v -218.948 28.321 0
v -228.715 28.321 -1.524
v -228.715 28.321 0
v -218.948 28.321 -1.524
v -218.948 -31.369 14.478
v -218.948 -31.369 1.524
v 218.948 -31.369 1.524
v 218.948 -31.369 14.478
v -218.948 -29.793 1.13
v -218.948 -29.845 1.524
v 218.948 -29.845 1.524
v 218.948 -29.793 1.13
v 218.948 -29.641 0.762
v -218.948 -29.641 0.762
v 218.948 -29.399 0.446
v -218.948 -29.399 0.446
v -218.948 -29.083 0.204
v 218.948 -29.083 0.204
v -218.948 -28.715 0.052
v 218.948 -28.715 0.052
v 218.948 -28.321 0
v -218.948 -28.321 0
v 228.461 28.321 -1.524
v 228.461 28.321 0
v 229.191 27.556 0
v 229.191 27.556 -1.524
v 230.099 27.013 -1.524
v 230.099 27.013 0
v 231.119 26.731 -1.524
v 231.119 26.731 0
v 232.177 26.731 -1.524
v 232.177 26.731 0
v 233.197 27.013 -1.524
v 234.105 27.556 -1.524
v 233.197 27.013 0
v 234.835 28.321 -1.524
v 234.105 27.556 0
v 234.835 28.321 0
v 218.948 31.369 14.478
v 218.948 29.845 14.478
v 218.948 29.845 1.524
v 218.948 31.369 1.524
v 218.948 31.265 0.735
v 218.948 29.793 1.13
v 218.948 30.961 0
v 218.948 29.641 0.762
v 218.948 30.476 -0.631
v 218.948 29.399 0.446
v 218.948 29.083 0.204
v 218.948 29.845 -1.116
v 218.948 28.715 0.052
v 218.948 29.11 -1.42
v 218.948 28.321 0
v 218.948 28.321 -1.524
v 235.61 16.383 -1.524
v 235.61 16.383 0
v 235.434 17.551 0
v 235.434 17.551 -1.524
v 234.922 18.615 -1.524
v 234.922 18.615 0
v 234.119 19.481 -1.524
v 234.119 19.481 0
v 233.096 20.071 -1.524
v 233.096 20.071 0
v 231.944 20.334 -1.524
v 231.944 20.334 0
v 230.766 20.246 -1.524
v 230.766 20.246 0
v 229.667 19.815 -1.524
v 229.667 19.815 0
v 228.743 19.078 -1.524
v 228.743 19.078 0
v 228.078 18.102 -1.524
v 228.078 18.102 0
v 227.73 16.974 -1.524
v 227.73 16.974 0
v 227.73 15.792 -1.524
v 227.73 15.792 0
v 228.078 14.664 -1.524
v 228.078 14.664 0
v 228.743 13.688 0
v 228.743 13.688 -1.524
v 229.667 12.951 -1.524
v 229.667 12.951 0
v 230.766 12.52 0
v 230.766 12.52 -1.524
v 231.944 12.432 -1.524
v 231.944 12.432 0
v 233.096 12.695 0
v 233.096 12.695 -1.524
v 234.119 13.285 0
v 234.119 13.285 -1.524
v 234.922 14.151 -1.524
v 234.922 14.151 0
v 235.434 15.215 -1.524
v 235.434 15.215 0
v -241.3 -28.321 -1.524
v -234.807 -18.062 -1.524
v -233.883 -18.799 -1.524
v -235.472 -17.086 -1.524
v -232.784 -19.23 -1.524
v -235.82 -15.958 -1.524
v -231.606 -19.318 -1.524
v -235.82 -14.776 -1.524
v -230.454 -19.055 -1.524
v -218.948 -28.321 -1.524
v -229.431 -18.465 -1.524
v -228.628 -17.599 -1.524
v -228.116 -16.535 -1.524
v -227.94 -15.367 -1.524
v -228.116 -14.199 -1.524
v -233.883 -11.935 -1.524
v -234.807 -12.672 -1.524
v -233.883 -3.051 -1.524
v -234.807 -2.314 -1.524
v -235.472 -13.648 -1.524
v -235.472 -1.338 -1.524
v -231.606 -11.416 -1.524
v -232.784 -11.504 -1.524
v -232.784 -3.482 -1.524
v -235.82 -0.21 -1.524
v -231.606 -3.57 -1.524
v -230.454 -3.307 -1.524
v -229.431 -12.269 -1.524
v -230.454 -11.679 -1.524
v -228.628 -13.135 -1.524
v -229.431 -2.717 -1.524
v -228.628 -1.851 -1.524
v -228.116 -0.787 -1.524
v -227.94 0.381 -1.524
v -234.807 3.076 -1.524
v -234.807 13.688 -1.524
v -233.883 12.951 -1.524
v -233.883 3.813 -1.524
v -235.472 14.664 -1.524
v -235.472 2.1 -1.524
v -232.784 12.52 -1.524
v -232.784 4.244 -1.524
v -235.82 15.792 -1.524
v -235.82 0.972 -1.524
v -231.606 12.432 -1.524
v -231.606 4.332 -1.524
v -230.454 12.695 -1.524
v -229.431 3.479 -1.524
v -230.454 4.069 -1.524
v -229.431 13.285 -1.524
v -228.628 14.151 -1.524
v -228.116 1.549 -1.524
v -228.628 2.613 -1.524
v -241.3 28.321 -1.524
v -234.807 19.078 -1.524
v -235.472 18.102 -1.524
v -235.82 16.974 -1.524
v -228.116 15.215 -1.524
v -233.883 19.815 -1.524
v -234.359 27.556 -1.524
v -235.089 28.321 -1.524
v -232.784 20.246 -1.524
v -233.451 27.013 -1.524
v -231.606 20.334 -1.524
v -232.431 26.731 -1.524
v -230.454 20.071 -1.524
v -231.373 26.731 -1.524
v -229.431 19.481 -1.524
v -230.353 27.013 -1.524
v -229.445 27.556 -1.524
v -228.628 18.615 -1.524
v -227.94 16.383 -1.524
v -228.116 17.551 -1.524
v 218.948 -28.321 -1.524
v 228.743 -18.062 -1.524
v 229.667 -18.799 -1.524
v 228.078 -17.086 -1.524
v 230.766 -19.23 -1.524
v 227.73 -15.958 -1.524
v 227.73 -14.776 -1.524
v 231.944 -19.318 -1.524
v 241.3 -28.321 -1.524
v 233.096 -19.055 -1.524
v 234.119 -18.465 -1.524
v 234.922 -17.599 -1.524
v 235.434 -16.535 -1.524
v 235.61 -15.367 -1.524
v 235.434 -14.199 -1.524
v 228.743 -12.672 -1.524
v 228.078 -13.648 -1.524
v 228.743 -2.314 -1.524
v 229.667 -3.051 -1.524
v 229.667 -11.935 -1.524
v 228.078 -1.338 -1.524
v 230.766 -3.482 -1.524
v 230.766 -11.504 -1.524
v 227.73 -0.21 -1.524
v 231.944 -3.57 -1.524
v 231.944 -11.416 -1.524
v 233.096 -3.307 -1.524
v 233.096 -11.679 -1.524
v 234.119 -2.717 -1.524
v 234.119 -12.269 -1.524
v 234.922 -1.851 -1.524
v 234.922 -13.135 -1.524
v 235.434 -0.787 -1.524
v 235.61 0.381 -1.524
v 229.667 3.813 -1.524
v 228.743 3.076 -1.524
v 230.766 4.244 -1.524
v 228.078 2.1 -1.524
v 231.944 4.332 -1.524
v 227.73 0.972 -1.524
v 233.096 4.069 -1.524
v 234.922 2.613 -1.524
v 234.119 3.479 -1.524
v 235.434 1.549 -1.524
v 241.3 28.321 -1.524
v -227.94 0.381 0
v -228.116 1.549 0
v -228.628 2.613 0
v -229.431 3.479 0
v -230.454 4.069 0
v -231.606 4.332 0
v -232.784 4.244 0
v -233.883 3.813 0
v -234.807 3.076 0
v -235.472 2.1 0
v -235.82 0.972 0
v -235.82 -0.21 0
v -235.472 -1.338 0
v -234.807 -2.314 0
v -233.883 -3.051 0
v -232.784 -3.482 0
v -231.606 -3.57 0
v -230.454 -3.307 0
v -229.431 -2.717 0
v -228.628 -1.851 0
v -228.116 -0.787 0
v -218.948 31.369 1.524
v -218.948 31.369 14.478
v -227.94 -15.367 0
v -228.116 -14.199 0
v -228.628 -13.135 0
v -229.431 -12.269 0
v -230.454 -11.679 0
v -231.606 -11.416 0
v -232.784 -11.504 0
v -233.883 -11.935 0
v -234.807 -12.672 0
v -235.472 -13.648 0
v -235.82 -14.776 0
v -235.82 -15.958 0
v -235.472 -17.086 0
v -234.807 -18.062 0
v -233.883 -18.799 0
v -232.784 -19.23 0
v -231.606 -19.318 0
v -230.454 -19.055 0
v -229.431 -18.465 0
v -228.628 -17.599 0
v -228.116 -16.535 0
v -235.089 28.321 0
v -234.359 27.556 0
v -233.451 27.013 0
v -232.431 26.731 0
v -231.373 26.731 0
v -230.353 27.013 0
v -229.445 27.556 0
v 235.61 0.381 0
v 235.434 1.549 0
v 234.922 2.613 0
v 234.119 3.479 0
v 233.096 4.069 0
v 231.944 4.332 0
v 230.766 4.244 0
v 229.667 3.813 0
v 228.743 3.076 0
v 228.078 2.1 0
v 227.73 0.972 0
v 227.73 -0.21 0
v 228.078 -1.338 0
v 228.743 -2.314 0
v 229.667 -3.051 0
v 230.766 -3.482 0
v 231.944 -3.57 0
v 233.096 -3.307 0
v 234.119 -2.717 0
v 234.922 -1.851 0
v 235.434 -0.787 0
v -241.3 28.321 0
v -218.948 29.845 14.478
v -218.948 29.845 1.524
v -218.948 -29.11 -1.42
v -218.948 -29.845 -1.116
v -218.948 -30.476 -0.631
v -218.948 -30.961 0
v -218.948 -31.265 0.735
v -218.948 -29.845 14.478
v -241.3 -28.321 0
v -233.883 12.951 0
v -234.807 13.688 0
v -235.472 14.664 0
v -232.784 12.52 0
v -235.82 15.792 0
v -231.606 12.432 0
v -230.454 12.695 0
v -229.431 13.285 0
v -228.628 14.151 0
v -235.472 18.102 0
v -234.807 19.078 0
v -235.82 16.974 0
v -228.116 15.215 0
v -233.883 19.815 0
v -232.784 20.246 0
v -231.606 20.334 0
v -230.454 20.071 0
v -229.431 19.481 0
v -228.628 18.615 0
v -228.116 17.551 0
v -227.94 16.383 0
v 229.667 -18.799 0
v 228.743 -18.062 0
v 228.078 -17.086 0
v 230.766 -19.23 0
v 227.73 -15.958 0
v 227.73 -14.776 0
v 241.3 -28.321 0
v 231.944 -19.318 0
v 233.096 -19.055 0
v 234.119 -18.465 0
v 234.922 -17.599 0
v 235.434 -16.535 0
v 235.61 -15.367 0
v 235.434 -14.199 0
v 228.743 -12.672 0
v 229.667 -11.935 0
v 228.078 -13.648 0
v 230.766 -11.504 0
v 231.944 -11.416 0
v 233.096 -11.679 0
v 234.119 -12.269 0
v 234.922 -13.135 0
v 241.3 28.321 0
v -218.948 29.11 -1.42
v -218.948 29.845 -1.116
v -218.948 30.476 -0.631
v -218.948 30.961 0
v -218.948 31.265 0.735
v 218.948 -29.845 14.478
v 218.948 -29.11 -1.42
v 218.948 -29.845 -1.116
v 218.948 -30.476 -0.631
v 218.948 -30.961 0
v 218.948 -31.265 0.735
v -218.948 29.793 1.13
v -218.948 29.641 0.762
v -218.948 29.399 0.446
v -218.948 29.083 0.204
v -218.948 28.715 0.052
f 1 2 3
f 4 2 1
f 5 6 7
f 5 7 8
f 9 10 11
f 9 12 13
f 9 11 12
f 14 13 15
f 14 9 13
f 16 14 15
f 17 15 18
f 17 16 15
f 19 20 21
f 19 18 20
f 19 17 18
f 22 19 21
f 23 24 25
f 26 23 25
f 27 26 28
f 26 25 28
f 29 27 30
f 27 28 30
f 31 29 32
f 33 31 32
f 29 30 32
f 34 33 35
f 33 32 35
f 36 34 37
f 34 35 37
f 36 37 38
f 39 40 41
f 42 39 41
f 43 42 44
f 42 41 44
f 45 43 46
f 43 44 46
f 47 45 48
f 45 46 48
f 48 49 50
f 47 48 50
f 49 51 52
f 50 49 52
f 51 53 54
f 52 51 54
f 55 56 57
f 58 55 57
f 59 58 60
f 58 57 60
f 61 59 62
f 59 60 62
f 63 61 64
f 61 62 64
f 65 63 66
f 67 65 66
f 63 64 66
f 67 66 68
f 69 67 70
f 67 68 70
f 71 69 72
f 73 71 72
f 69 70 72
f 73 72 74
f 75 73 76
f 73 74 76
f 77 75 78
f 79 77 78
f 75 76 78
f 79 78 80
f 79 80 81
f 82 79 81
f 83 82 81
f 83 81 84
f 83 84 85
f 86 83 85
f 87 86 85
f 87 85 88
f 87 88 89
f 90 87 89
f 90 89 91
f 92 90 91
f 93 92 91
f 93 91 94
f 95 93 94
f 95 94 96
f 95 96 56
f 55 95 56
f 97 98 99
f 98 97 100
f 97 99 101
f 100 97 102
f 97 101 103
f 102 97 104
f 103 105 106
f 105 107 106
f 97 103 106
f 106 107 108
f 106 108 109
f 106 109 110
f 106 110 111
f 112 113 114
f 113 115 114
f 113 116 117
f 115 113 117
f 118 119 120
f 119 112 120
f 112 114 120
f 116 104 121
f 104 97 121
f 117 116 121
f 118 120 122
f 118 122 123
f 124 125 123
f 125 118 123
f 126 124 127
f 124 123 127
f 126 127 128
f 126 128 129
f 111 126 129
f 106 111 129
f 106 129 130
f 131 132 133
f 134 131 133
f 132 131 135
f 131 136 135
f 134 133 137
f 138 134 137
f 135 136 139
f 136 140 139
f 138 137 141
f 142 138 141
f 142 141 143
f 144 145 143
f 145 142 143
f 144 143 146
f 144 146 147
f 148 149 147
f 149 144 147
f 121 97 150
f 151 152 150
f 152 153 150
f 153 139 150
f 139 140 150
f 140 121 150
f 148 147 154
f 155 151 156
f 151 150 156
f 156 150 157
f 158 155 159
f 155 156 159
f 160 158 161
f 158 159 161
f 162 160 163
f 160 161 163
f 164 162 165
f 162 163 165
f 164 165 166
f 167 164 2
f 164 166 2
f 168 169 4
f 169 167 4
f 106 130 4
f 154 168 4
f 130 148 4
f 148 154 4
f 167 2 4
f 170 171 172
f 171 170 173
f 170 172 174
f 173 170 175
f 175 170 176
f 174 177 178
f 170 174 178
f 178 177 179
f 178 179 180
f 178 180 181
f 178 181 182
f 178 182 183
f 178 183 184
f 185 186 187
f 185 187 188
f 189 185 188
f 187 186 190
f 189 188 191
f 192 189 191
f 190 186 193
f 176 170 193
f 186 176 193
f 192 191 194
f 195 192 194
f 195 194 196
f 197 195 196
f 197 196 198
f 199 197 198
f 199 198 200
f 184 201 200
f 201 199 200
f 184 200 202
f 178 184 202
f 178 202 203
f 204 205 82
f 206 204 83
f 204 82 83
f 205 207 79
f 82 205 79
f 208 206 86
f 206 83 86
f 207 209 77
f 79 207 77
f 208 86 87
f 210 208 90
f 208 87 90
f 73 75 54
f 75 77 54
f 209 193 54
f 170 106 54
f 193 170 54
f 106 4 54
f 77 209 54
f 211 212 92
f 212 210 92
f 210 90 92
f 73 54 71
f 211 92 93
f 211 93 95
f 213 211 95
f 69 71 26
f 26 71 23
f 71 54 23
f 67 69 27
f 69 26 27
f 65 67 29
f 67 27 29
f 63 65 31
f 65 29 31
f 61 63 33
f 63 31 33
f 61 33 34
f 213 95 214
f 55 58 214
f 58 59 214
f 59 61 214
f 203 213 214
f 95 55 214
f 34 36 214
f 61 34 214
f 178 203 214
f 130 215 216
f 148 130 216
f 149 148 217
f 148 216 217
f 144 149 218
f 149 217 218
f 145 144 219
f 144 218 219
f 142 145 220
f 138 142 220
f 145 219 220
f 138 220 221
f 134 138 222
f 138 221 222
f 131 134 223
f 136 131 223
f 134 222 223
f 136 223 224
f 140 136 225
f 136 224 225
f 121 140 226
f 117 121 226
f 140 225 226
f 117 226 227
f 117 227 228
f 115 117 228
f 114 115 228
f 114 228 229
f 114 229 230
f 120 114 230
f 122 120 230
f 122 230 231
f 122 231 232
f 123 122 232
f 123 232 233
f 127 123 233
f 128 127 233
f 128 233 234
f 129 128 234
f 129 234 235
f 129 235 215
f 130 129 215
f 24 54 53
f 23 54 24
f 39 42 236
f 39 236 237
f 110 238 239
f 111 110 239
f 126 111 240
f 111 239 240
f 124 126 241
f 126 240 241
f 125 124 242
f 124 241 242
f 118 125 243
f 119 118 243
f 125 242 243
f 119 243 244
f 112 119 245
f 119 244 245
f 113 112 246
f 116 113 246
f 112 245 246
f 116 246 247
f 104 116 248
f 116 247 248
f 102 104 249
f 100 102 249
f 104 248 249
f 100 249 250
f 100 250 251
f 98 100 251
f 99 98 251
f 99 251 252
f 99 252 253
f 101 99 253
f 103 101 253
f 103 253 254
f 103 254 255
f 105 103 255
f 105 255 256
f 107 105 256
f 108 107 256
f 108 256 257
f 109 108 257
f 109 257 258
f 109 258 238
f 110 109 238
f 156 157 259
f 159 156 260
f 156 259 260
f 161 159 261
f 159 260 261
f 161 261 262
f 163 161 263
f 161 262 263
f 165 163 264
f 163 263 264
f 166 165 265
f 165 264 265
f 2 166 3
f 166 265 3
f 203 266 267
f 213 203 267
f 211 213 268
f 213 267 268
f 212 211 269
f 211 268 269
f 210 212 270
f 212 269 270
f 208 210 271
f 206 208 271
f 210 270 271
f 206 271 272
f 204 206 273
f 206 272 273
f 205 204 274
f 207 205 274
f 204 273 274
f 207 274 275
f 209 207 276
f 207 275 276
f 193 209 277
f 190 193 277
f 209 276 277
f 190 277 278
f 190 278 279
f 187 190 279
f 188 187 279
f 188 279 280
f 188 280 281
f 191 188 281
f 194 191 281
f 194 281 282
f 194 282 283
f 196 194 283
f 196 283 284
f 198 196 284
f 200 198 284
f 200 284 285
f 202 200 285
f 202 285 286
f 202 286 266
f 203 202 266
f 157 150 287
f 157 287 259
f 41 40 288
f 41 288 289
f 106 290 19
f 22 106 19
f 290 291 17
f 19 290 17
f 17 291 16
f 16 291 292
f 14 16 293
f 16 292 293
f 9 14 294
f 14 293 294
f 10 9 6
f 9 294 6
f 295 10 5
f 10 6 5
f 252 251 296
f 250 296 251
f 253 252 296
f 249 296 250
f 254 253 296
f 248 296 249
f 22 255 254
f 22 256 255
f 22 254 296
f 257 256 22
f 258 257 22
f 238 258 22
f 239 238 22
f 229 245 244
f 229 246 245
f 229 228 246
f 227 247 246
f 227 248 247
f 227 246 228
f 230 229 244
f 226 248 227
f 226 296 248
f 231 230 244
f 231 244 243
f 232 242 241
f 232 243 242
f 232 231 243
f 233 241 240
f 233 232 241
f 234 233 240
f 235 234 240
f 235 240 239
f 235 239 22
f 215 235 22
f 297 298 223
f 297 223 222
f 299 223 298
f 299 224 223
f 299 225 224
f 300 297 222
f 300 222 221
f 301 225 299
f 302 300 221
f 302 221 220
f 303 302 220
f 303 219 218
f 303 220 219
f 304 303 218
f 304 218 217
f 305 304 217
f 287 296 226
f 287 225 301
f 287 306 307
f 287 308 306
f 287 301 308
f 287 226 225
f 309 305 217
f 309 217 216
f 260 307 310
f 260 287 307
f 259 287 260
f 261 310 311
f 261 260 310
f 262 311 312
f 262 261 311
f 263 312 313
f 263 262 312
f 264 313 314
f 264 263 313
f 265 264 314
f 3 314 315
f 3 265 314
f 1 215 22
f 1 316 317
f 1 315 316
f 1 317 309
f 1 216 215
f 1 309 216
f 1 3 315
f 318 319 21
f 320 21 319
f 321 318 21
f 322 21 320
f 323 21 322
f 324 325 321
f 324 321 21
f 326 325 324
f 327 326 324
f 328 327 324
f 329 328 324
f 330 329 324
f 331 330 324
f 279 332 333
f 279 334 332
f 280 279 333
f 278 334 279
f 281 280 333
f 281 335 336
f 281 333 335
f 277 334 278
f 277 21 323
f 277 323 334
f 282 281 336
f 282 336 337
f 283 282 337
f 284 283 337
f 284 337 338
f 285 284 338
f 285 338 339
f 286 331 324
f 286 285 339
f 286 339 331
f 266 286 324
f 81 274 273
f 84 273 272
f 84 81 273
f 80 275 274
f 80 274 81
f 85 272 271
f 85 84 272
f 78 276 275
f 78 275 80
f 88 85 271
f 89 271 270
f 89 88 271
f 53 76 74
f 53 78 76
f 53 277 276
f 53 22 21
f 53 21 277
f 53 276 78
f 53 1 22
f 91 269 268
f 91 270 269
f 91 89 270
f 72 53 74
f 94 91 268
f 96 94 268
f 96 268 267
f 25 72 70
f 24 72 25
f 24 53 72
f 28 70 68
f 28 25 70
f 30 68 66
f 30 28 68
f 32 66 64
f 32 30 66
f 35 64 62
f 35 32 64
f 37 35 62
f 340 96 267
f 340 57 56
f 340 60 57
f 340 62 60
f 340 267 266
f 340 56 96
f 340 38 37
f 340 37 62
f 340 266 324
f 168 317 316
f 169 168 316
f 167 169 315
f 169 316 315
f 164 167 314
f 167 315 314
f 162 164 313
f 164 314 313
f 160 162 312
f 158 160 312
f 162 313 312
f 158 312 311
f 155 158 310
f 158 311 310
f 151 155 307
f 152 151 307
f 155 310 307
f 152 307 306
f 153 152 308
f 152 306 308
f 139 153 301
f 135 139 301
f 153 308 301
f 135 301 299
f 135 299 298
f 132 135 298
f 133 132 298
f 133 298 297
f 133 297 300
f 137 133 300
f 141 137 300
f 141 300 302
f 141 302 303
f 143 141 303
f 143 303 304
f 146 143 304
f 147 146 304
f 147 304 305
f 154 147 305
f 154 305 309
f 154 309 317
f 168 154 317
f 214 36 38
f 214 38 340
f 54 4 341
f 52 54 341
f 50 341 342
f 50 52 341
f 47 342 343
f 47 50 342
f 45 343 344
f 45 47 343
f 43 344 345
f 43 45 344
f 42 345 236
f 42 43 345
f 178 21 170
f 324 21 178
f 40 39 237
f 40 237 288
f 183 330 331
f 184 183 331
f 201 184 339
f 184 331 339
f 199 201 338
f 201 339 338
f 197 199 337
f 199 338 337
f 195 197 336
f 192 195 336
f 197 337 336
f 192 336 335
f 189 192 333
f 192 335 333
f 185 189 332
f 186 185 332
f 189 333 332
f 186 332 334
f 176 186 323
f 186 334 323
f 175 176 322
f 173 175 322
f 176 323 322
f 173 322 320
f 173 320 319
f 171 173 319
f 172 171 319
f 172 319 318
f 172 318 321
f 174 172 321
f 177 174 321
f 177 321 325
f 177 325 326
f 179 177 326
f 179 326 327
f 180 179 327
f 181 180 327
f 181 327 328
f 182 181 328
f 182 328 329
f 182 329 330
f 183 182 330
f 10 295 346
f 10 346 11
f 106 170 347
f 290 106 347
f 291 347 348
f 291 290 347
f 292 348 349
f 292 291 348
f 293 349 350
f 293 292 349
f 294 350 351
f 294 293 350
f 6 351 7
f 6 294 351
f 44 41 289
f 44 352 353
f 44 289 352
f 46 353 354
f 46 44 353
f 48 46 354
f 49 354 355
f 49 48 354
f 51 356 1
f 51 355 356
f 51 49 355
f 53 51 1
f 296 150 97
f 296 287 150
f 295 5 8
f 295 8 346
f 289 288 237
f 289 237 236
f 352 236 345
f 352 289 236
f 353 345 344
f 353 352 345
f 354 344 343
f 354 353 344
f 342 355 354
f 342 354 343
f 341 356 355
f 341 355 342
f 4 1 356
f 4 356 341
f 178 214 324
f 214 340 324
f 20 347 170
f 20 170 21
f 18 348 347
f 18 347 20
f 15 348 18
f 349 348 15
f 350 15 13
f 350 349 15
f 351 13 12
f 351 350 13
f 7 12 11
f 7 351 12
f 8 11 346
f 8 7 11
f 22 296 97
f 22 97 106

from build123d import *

# Parameters (mm, degrees)
CROQUIS1_W                         = 482.6
CROQUIS1_H                         = 62.738
BRIDA_BASE1_DEPTH                  = 1.524
BRIDA_DE_ARISTA1_STRIP_W           = 9.144
BRIDA_DE_ARISTA1_STRIP_H           = 1.524
BRIDA_DE_ARISTA1_STRIP_CUT_DEPTH   = 482.6
BRIDA_DE_ARISTA1_STRIP_2_W         = 9.144
BRIDA_DE_ARISTA1_STRIP_2_H         = 1.524
BRIDA_DE_ARISTA1_STRIP_CUT_2_DEPTH = 482.6
BRIDA_DE_ARISTA1_DEPTH             = 482.6
BRIDA_DE_ARISTA1_BEND_DEPTH        = 482.6
CROQUIS12_R                        = 3.9624
CORTAR_EXTRUIR1_DEPTH              = 58.166
CORTAR_EXTRUIR2_DEPTH              = 1.016
CORTAR_EXTRUIR2_DEPTH_BACK         = 3.048
CROQUIS13_W                        = 22.352
CROQUIS13_H                        = 16.002
CROQUIS14_W                        = 22.352
CROQUIS14_H                        = 16.002
CORTAR_EXTRUIR3_DEPTH              = 3.048
CROQUIS15_R                        = 3.937
CORTAR_EXTRUIR4_DEPTH              = 2.794


# Sheet-metal steps are written as plain solids
with BuildPart() as part:
    # Croquis1 → Brida base1 (new body)
    with BuildSketch(Plane.XY):
        Rectangle(CROQUIS1_W, CROQUIS1_H)
    extrude(amount=-BRIDA_BASE1_DEPTH)

    # Brida de arista1 strip (across the edge) → Brida de arista1 strip cut (cut)
    with BuildSketch(Plane(origin=(241.3, 31.369, 0), x_dir=(0, -1, 0), z_dir=(-1, 0, 0))):
        with Locations((-1.524, -0.762)):
            Rectangle(BRIDA_DE_ARISTA1_STRIP_W, BRIDA_DE_ARISTA1_STRIP_H)
    extrude(amount=BRIDA_DE_ARISTA1_STRIP_CUT_DEPTH, mode=Mode.SUBTRACT)

    # Brida de arista1 strip 2 (across the edge) → Brida de arista1 strip cut 2 (cut)
    with BuildSketch(Plane(origin=(-241.3, -31.369, 0), x_dir=(0, 1, 0), z_dir=(1, 0, 0))):
        with Locations((-1.524, -0.762)):
            Rectangle(BRIDA_DE_ARISTA1_STRIP_2_W, BRIDA_DE_ARISTA1_STRIP_2_H)
    extrude(amount=BRIDA_DE_ARISTA1_STRIP_CUT_2_DEPTH, mode=Mode.SUBTRACT)

    # Brida de arista1 section (across the edge) → Brida de arista1 (add)
    with BuildSketch(Plane(origin=(241.3, 31.369, 0), x_dir=(0, -1, 0), z_dir=(-1, 0, 0))):
        with BuildLine():
            Line((0, 1.524), (0, 14.478))
            Line((0, 14.478), (1.524, 14.478))
            Line((1.524, 14.478), (1.524, 1.524))
            ThreePointArc((1.524, 1.524), (1.970369265, 0.446369265), (3.048, 0))
            Line((3.048, 0), (3.048, -1.524))
            ThreePointArc((3.048, -1.524), (0.892738531, -0.631261469), (0, 1.524))
        make_face()
    extrude(amount=BRIDA_DE_ARISTA1_DEPTH)

    # Brida de arista1 section 2 (across the edge) → Brida de arista1 bend (add)
    with BuildSketch(Plane(origin=(-241.3, -31.369, 0), x_dir=(0, 1, 0), z_dir=(1, 0, 0))):
        with BuildLine():
            Line((0, 1.524), (0, 14.478))
            Line((0, 14.478), (1.524, 14.478))
            Line((1.524, 14.478), (1.524, 1.524))
            ThreePointArc((1.524, 1.524), (1.970369265, 0.446369265), (3.048, 0))
            Line((3.048, 0), (3.048, -1.524))
            ThreePointArc((3.048, -1.524), (0.892738531, -0.631261469), (0, 1.524))
        make_face()
    extrude(amount=BRIDA_DE_ARISTA1_BEND_DEPTH)

    # Croquis12 → Cortar-Extruir1 (cut)
    with BuildSketch(Plane.XY):
        with Locations((231.648, 16.383)):
            Circle(CROQUIS12_R)
        with Locations((231.648, 0.381)):
            Circle(CROQUIS12_R)
        with Locations((231.648, -15.367)):
            Circle(CROQUIS12_R)
        with Locations((-231.902, 16.383)):
            Circle(CROQUIS12_R)
        with Locations((-231.902, 0.381)):
            Circle(CROQUIS12_R)
        with Locations((-231.902, -15.367)):
            Circle(CROQUIS12_R)
    extrude(amount=-CORTAR_EXTRUIR1_DEPTH, mode=Mode.SUBTRACT)

    # Croquis13 → Cortar-Extruir2 (cut, two sides: drawn at the far end of the back side and taken through both)
    with BuildSketch(Plane(origin=(0, 31.369, 0), x_dir=(1, 0, 0), z_dir=(0, 1, 0)).offset(-CORTAR_EXTRUIR2_DEPTH_BACK)):
        with Locations((230.124, -6.477)):
            Rectangle(CROQUIS13_W, CROQUIS13_H)
        with Locations((-230.124, -6.477)):
            Rectangle(CROQUIS13_W, CROQUIS13_H)
    extrude(amount=CORTAR_EXTRUIR2_DEPTH + CORTAR_EXTRUIR2_DEPTH_BACK, mode=Mode.SUBTRACT)

    # Croquis14 → Cortar-Extruir3 (cut)
    with BuildSketch(Plane.XZ.offset(31.369)):
        with Locations((-230.124, 6.477)):
            Rectangle(CROQUIS14_W, CROQUIS14_H)
        with Locations((230.124, 6.477)):
            Rectangle(CROQUIS14_W, CROQUIS14_H)
    extrude(amount=-CORTAR_EXTRUIR3_DEPTH, mode=Mode.SUBTRACT)

    # Croquis15 → Cortar-Extruir4 (cut)
    with BuildSketch(Plane.XY):
        with Locations((-231.902, 30.6324)):
            Circle(CROQUIS15_R)
        with Locations((231.648, 30.6324)):
            Circle(CROQUIS15_R)
    extrude(amount=-CORTAR_EXTRUIR4_DEPTH, mode=Mode.SUBTRACT)


solid = part.part
